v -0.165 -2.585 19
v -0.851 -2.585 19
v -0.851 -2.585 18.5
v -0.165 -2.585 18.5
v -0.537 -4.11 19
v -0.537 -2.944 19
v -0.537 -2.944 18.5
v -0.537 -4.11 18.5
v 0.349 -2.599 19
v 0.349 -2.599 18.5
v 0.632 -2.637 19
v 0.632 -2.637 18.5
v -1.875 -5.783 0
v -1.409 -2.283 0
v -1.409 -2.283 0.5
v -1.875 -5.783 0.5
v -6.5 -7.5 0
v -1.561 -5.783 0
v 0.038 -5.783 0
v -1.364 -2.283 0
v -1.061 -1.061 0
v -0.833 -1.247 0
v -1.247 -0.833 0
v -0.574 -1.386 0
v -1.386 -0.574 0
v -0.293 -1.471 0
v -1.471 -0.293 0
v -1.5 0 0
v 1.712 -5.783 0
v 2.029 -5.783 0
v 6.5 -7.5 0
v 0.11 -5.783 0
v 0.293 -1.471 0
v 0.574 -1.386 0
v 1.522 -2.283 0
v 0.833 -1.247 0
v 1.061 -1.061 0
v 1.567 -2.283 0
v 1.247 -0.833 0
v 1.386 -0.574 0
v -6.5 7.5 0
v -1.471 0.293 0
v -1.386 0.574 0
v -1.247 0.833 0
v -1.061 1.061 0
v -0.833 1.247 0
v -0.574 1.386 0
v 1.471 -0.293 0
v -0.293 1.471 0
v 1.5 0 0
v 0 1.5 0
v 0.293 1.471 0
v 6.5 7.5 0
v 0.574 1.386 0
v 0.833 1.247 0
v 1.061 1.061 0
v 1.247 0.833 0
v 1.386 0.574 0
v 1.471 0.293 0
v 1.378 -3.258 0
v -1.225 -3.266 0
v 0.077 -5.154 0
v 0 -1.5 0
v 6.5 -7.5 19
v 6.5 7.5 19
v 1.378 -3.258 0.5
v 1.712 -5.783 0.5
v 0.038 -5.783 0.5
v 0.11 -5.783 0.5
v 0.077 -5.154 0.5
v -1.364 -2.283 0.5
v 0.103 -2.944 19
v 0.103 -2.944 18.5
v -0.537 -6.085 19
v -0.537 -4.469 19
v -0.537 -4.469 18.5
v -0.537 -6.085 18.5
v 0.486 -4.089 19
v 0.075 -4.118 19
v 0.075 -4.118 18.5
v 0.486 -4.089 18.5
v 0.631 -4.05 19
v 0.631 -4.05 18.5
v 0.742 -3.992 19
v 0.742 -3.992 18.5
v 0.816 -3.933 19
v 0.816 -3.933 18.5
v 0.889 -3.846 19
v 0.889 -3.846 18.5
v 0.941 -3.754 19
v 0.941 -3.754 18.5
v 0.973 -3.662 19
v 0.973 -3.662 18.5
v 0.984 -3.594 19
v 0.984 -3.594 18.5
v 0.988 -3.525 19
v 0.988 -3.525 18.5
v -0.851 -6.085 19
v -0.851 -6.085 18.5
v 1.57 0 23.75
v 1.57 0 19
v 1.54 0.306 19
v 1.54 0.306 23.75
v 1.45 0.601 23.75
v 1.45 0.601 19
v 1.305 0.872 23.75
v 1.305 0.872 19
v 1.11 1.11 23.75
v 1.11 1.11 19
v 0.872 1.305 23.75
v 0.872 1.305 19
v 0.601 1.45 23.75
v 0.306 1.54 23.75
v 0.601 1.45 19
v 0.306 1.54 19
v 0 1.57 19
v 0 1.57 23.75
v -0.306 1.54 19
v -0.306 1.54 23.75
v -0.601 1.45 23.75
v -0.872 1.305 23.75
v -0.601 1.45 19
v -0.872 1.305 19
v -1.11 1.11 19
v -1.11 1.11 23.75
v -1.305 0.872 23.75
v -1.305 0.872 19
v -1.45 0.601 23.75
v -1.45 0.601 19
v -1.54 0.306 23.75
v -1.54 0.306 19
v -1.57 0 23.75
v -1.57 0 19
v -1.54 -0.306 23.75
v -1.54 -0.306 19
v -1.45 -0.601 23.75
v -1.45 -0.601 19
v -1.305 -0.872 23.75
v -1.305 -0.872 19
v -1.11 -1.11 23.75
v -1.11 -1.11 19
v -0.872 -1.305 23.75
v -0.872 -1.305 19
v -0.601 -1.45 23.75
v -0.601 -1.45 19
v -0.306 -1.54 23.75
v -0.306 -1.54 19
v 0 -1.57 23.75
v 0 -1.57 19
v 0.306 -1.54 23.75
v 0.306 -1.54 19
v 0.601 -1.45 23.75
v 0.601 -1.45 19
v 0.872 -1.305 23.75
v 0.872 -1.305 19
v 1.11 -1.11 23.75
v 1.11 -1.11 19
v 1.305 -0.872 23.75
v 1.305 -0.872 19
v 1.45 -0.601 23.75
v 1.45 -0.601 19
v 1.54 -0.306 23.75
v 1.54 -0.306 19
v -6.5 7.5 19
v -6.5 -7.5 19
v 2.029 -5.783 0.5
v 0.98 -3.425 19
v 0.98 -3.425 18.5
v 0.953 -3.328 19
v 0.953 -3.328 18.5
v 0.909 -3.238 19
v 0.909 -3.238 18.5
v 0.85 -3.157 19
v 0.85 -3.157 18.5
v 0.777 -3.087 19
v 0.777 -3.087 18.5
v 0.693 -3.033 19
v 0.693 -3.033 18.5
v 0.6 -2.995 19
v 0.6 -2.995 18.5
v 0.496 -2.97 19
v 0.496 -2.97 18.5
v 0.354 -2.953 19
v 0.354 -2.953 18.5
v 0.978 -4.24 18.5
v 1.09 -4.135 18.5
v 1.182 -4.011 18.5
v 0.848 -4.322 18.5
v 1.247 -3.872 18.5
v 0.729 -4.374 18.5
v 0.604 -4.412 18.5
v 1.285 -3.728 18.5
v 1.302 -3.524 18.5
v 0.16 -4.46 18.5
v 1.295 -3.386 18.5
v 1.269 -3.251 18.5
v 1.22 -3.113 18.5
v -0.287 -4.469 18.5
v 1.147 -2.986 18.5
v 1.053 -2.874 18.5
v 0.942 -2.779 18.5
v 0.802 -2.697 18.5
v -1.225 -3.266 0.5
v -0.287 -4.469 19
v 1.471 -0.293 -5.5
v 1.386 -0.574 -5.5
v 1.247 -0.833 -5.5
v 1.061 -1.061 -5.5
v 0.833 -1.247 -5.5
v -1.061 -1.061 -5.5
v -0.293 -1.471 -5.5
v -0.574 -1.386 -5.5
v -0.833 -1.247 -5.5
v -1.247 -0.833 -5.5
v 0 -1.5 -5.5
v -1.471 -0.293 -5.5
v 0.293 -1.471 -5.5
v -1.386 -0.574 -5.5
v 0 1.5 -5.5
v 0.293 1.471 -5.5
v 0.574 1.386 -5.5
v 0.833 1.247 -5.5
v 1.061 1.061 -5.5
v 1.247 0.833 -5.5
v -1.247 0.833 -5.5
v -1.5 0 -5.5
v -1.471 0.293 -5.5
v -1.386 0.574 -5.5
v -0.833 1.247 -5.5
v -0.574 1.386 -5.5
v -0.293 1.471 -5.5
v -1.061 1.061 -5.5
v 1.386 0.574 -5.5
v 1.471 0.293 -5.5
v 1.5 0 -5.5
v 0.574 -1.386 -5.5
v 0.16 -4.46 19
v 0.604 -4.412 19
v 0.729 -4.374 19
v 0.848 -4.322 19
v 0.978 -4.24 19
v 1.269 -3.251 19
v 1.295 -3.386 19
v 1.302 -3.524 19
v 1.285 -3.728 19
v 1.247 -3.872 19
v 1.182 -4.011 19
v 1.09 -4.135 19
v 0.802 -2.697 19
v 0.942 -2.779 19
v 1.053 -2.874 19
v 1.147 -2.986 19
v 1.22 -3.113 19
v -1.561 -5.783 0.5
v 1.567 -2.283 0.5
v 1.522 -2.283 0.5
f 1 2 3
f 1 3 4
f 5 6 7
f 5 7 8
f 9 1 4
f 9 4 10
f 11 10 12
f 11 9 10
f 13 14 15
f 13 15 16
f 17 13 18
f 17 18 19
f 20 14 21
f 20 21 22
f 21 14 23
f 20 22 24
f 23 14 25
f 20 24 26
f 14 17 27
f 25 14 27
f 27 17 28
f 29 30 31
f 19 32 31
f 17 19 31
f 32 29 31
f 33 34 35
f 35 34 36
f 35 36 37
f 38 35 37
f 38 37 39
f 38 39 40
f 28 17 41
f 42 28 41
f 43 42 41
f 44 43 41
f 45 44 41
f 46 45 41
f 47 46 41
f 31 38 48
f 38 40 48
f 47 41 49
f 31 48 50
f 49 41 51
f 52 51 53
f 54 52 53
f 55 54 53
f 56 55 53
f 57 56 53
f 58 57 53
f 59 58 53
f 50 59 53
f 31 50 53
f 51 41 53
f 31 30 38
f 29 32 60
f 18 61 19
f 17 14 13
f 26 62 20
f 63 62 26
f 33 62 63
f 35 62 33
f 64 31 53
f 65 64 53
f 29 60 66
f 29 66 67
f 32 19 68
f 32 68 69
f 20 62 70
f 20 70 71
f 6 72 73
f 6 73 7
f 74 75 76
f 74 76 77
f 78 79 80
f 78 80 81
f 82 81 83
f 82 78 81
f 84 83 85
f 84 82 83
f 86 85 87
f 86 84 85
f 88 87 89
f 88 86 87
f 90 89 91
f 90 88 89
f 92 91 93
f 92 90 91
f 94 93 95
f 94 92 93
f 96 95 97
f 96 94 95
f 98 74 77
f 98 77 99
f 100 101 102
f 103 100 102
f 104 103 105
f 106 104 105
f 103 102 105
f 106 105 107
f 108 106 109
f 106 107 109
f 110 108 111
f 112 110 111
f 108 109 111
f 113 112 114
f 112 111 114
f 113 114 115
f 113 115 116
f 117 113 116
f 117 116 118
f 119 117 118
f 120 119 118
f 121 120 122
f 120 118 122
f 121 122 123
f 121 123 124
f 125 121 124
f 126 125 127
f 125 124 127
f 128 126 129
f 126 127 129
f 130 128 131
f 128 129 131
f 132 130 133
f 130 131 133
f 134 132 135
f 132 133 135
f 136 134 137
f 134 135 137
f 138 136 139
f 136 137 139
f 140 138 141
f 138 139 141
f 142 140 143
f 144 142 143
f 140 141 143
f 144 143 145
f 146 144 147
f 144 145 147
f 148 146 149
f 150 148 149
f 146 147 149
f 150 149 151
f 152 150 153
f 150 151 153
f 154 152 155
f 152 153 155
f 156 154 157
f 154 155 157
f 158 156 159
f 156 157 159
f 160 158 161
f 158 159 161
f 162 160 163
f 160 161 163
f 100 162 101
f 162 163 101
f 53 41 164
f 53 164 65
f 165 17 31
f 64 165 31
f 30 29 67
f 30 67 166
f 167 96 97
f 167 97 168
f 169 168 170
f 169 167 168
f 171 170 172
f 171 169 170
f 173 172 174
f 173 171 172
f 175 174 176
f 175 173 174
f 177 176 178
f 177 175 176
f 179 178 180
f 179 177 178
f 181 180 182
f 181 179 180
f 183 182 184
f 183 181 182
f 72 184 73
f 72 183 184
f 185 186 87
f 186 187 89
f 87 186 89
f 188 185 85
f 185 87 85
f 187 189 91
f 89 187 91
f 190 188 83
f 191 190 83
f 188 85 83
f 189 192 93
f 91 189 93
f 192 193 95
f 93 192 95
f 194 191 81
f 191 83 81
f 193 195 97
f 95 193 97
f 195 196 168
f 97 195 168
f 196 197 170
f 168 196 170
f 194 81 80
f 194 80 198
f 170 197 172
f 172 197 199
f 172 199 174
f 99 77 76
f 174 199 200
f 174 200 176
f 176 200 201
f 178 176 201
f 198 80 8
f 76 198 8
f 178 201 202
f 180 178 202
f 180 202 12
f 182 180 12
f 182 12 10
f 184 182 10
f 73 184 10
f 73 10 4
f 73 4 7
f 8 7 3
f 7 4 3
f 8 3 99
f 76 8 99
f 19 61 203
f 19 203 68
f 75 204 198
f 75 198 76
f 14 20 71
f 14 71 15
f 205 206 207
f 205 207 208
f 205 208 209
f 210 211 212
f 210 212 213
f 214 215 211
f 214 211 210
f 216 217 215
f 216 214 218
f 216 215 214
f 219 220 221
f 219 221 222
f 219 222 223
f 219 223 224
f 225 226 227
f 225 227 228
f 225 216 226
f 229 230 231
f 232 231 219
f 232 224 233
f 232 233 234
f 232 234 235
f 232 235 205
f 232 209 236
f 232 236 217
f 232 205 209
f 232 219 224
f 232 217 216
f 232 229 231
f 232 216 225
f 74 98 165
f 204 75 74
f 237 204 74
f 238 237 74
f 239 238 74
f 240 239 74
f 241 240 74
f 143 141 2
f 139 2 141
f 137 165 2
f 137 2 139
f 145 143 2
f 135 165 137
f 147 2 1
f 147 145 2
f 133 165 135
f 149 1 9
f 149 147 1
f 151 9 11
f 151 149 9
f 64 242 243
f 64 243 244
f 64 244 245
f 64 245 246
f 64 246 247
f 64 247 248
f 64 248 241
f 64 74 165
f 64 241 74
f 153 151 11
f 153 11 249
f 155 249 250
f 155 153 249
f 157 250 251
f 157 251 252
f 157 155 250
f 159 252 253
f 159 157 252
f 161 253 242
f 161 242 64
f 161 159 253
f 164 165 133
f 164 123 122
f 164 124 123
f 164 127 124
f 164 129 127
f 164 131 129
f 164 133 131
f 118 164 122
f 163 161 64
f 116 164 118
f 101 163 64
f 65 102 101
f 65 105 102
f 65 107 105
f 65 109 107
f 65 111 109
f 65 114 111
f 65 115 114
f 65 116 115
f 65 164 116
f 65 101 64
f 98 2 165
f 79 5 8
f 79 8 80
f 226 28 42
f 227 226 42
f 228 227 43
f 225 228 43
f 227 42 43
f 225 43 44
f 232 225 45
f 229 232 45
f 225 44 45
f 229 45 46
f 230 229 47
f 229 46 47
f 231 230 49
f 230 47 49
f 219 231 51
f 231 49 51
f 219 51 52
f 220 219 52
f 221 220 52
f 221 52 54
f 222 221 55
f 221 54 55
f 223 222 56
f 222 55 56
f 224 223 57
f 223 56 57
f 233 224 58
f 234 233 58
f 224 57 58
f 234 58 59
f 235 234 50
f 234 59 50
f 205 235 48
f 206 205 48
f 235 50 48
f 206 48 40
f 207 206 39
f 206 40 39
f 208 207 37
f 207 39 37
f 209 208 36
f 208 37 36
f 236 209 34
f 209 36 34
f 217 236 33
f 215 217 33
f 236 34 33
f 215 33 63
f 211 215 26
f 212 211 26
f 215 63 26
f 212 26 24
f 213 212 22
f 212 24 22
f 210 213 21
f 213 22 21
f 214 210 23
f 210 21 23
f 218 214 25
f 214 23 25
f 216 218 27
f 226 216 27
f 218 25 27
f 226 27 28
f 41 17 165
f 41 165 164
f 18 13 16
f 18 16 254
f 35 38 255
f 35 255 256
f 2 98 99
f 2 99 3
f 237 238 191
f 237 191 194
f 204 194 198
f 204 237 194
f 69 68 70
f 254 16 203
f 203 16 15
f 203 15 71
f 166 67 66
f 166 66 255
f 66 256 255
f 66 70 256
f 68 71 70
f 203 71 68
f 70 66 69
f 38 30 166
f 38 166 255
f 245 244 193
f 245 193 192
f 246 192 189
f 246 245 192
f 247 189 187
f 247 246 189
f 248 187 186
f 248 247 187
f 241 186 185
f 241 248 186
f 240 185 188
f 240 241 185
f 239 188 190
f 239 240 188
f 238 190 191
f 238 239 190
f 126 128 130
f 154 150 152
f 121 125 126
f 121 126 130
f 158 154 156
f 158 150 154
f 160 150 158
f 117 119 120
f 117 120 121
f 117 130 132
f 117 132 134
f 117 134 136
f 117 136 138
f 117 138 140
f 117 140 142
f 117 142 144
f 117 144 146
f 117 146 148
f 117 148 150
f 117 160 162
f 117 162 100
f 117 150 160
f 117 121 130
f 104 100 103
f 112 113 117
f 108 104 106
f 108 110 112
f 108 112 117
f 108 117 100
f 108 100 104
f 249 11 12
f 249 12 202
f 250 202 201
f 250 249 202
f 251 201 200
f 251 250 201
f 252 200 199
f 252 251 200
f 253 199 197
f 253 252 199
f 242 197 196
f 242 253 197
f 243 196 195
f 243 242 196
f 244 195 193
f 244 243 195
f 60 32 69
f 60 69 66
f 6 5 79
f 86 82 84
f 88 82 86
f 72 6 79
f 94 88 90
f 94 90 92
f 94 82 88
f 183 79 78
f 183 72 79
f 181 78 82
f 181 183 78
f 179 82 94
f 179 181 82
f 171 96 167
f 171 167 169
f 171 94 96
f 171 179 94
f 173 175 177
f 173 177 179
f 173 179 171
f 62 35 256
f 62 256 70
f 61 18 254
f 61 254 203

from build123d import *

# Parameters (mm, degrees)
SKETCH1_W           = 13
SKETCH1_H           = 15
BOSS_EXTRUDE1_DEPTH = 19
SKETCH2_R           = 1.57
BOSS_EXTRUDE2_DEPTH = 4.75
SKETCH3_R           = 1.5
BOSS_EXTRUDE3_DEPTH = 5.5
CUT_EXTRUDE1_DEPTH  = 0.5
CUT_EXTRUDE2_DEPTH  = 0.5


with BuildPart() as part:
    # Sketch1 → Boss-Extrude1 (new body)
    with BuildSketch(Plane.XY):
        Rectangle(SKETCH1_W, SKETCH1_H)
    extrude(amount=BOSS_EXTRUDE1_DEPTH)

    # Sketch2 → Boss-Extrude2 (add)
    with BuildSketch(Plane.XY.offset(19)):
        Circle(SKETCH2_R)
    extrude(amount=BOSS_EXTRUDE2_DEPTH)

    # Sketch3 → Boss-Extrude3 (add)
    with BuildSketch(Plane(origin=(0, 0, 0), x_dir=(-1, 0, 0), z_dir=(0, 0, -1))):
        Circle(SKETCH3_R)
    extrude(amount=BOSS_EXTRUDE3_DEPTH)

    # Sketch4 → Cut-Extrude1 (cut)
    with BuildSketch(Plane(origin=(0, 0, 0), x_dir=(-1, 0, 0), z_dir=(0, 0, -1))):
        Polygon((-2.028652102, -5.782501305), (-1.56661284, -2.282501305), (-1.521741045, -2.282501305), (-0.076729025, -5.154296177), (1.364076263, -2.282501305), (1.408948058, -2.282501305), (1.875194051, -5.782501305), (1.561091487, -5.782501305), (1.224553026, -3.266175183), (-0.038167327, -5.782501305), (-0.10968175, -5.782501305), (-1.378011077, -3.258462844), (-1.712446173, -5.782501305), align=None)
    extrude(amount=-CUT_EXTRUDE1_DEPTH, mode=Mode.SUBTRACT)

    # Sketch5 → Cut-Extrude2 (cut)
    with BuildSketch(Plane.XY.offset(19)):
        with BuildLine():
            Line((-0.851399992, -2.584854315), (-0.165001755, -2.584854315))
            add(Edge.make_bspline(
                [(-0.165001755, -2.584854315), (-0.117790848, -2.584906211), (-0.027332656, -2.585005646), (0.1023824, -2.588020392), (0.220192132, -2.592047084), (0.325842513, -2.597628978), (0.419658611, -2.604225568), (0.50121591, -2.613477607), (0.571155467, -2.623137903), (0.613061916, -2.632959309), (0.632173726, -2.637438449)],
                knots=[0, 0, 0, 0, 0.000141628, 0.000271366, 0.00038923, 0.000495248, 0.00058876, 0.000671296, 0.000741499, 0.00080036, 0.00080036, 0.00080036, 0.00080036], degree=3))
            add(Edge.make_bspline(
                [(0.632173726, -2.637438449), (0.65636726, -2.644060399), (0.704184237, -2.657148261), (0.77308528, -2.683361984), (0.838639126, -2.71444415), (0.901070684, -2.749868089), (0.959612767, -2.791153654), (1.015138808, -2.836627271), (1.067158788, -2.88733884), (1.11538018, -2.94271958), (1.159664978, -3.00183979), (1.197794661, -3.06558202), (1.229721888, -3.132873323), (1.257105159, -3.203666894), (1.276813614, -3.278557218), (1.291660513, -3.35702393), (1.301084141, -3.43905862), (1.301986703, -3.495118488), (1.302446162, -3.523656398)],
                knots=[0, 0, 0, 0, 7.5216e-05, 0.00014866, 0.000220794, 0.000292713, 0.000363707, 0.000435434, 0.000507823, 0.000581364, 0.000655543, 0.000729131, 0.000803767, 0.000878771, 0.000956497, 0.001035702, 0.001118238, 0.001203821, 0.001203821, 0.001203821, 0.001203821], degree=3))
            add(Edge.make_bspline(
                [(1.302446162, -3.523656398), (1.302024737, -3.552434175), (1.301200191, -3.608739839), (1.291303906, -3.691112627), (1.277973714, -3.769831017), (1.257476662, -3.844720468), (1.230630989, -3.915336238), (1.199138936, -3.98275747), (1.161155406, -4.045837142), (1.117510576, -4.10480426), (1.068958982, -4.159714172), (1.015706044, -4.210168966), (0.957966751, -4.255873305), (0.895924603, -4.296929648), (0.828974754, -4.332385928), (0.758132601, -4.364143233), (0.682782384, -4.390814293), (0.63063987, -4.404844355), (0.604128854, -4.411977712)],
                knots=[0, 0, 0, 0, 8.6284e-05, 0.00016882, 0.000248587, 0.000325638, 0.000401297, 0.000474998, 0.000548586, 0.000621785, 0.0006948, 0.0007682, 0.000841564, 0.000915458, 0.000991056, 0.00106858, 0.00114819, 0.001230532, 0.001230532, 0.001230532, 0.001230532], degree=3))
            add(Edge.make_bspline(
                [(0.604128854, -4.411977712), (0.58220152, -4.416640693), (0.534146493, -4.426859887), (0.455003771, -4.438268344), (0.362858385, -4.448005945), (0.257836105, -4.455307082), (0.1400312, -4.461557451), (0.009379943, -4.466525545), (-0.134374134, -4.469255399), (-0.234645379, -4.469396191), (-0.286996947, -4.469469699)],
                knots=[0, 0, 0, 0, 6.7238e-05, 0.000147357, 0.000239727, 0.000345177, 0.000463135, 0.000593636, 0.000737393, 0.000894446, 0.000894446, 0.000894446, 0.000894446], degree=3))
            Line((-0.286996947, -4.469469699), (-0.537297428, -4.469469699))
            Line((-0.537297428, -4.469469699), (-0.537297428, -6.084854315))
            Line((-0.537297428, -6.084854315), (-0.851399992, -6.084854315))
            Line((-0.851399992, -6.084854315), (-0.851399992, -2.584854315))
        make_face()
        with BuildLine():
            Line((-0.537297428, -2.943828674), (-0.537297428, -4.11049534))
            Line((-0.537297428, -4.11049534), (0.075483021, -4.11820768))
            add(Edge.make_bspline(
                [(0.075483021, -4.11820768), (0.105402947, -4.118223144), (0.163162747, -4.118252996), (0.24659897, -4.114267772), (0.324008257, -4.10966724), (0.395152833, -4.102931316), (0.460064767, -4.093410059), (0.518852296, -4.083798321), (0.571059579, -4.069892958), (0.632158781, -4.051169889), (0.700242128, -4.019237273), (0.774309677, -3.972887383), (0.837080263, -3.913806675), (0.89139856, -3.847378844), (0.934504438, -3.773479714), (0.96606043, -3.694410778), (0.984601587, -3.610982928), (0.987087781, -3.553894789), (0.988343598, -3.525058642)],
                knots=[0, 0, 0, 0, 8.9746e-05, 0.000173253, 0.000250533, 0.00032239, 0.000387534, 0.00044736, 0.000500926, 0.000549486, 0.000638903, 0.000725641, 0.000810488, 0.000896226, 0.000982324, 0.00106604, 0.001150757, 0.001237226, 0.001237226, 0.001237226, 0.001237226], degree=3))
            add(Edge.make_bspline(
                [(0.988343598, -3.525058642), (0.987080951, -3.496920128), (0.984570966, -3.440984246), (0.965915103, -3.359005485), (0.934565789, -3.280769781), (0.891109195, -3.207796696), (0.838368065, -3.141607892), (0.777068722, -3.084110765), (0.707355461, -3.037889062), (0.642507229, -3.00805578), (0.584906043, -2.989840505), (0.534874084, -2.977095664), (0.478383409, -2.966920058), (0.41541563, -2.958680555), (0.346458796, -2.951627094), (0.270920481, -2.946841117), (0.189086838, -2.944039661), (0.132276267, -2.943900705), (0.102826771, -2.943828674)],
                knots=[0, 0, 0, 0, 8.4371e-05, 0.000167719, 0.000250783, 0.000336277, 0.000421575, 0.000503926, 0.000587348, 0.000671427, 0.000717102, 0.000768457, 0.000826213, 0.000889178, 0.000958942, 0.001034123, 0.001116202, 0.001204546, 0.001204546, 0.001204546, 0.001204546], degree=3))
            Line((0.102826771, -2.943828674), (-0.537297428, -2.943828674))
        make_face(mode=Mode.SUBTRACT)
    extrude(amount=-CUT_EXTRUDE2_DEPTH, mode=Mode.SUBTRACT)


solid = part.part
